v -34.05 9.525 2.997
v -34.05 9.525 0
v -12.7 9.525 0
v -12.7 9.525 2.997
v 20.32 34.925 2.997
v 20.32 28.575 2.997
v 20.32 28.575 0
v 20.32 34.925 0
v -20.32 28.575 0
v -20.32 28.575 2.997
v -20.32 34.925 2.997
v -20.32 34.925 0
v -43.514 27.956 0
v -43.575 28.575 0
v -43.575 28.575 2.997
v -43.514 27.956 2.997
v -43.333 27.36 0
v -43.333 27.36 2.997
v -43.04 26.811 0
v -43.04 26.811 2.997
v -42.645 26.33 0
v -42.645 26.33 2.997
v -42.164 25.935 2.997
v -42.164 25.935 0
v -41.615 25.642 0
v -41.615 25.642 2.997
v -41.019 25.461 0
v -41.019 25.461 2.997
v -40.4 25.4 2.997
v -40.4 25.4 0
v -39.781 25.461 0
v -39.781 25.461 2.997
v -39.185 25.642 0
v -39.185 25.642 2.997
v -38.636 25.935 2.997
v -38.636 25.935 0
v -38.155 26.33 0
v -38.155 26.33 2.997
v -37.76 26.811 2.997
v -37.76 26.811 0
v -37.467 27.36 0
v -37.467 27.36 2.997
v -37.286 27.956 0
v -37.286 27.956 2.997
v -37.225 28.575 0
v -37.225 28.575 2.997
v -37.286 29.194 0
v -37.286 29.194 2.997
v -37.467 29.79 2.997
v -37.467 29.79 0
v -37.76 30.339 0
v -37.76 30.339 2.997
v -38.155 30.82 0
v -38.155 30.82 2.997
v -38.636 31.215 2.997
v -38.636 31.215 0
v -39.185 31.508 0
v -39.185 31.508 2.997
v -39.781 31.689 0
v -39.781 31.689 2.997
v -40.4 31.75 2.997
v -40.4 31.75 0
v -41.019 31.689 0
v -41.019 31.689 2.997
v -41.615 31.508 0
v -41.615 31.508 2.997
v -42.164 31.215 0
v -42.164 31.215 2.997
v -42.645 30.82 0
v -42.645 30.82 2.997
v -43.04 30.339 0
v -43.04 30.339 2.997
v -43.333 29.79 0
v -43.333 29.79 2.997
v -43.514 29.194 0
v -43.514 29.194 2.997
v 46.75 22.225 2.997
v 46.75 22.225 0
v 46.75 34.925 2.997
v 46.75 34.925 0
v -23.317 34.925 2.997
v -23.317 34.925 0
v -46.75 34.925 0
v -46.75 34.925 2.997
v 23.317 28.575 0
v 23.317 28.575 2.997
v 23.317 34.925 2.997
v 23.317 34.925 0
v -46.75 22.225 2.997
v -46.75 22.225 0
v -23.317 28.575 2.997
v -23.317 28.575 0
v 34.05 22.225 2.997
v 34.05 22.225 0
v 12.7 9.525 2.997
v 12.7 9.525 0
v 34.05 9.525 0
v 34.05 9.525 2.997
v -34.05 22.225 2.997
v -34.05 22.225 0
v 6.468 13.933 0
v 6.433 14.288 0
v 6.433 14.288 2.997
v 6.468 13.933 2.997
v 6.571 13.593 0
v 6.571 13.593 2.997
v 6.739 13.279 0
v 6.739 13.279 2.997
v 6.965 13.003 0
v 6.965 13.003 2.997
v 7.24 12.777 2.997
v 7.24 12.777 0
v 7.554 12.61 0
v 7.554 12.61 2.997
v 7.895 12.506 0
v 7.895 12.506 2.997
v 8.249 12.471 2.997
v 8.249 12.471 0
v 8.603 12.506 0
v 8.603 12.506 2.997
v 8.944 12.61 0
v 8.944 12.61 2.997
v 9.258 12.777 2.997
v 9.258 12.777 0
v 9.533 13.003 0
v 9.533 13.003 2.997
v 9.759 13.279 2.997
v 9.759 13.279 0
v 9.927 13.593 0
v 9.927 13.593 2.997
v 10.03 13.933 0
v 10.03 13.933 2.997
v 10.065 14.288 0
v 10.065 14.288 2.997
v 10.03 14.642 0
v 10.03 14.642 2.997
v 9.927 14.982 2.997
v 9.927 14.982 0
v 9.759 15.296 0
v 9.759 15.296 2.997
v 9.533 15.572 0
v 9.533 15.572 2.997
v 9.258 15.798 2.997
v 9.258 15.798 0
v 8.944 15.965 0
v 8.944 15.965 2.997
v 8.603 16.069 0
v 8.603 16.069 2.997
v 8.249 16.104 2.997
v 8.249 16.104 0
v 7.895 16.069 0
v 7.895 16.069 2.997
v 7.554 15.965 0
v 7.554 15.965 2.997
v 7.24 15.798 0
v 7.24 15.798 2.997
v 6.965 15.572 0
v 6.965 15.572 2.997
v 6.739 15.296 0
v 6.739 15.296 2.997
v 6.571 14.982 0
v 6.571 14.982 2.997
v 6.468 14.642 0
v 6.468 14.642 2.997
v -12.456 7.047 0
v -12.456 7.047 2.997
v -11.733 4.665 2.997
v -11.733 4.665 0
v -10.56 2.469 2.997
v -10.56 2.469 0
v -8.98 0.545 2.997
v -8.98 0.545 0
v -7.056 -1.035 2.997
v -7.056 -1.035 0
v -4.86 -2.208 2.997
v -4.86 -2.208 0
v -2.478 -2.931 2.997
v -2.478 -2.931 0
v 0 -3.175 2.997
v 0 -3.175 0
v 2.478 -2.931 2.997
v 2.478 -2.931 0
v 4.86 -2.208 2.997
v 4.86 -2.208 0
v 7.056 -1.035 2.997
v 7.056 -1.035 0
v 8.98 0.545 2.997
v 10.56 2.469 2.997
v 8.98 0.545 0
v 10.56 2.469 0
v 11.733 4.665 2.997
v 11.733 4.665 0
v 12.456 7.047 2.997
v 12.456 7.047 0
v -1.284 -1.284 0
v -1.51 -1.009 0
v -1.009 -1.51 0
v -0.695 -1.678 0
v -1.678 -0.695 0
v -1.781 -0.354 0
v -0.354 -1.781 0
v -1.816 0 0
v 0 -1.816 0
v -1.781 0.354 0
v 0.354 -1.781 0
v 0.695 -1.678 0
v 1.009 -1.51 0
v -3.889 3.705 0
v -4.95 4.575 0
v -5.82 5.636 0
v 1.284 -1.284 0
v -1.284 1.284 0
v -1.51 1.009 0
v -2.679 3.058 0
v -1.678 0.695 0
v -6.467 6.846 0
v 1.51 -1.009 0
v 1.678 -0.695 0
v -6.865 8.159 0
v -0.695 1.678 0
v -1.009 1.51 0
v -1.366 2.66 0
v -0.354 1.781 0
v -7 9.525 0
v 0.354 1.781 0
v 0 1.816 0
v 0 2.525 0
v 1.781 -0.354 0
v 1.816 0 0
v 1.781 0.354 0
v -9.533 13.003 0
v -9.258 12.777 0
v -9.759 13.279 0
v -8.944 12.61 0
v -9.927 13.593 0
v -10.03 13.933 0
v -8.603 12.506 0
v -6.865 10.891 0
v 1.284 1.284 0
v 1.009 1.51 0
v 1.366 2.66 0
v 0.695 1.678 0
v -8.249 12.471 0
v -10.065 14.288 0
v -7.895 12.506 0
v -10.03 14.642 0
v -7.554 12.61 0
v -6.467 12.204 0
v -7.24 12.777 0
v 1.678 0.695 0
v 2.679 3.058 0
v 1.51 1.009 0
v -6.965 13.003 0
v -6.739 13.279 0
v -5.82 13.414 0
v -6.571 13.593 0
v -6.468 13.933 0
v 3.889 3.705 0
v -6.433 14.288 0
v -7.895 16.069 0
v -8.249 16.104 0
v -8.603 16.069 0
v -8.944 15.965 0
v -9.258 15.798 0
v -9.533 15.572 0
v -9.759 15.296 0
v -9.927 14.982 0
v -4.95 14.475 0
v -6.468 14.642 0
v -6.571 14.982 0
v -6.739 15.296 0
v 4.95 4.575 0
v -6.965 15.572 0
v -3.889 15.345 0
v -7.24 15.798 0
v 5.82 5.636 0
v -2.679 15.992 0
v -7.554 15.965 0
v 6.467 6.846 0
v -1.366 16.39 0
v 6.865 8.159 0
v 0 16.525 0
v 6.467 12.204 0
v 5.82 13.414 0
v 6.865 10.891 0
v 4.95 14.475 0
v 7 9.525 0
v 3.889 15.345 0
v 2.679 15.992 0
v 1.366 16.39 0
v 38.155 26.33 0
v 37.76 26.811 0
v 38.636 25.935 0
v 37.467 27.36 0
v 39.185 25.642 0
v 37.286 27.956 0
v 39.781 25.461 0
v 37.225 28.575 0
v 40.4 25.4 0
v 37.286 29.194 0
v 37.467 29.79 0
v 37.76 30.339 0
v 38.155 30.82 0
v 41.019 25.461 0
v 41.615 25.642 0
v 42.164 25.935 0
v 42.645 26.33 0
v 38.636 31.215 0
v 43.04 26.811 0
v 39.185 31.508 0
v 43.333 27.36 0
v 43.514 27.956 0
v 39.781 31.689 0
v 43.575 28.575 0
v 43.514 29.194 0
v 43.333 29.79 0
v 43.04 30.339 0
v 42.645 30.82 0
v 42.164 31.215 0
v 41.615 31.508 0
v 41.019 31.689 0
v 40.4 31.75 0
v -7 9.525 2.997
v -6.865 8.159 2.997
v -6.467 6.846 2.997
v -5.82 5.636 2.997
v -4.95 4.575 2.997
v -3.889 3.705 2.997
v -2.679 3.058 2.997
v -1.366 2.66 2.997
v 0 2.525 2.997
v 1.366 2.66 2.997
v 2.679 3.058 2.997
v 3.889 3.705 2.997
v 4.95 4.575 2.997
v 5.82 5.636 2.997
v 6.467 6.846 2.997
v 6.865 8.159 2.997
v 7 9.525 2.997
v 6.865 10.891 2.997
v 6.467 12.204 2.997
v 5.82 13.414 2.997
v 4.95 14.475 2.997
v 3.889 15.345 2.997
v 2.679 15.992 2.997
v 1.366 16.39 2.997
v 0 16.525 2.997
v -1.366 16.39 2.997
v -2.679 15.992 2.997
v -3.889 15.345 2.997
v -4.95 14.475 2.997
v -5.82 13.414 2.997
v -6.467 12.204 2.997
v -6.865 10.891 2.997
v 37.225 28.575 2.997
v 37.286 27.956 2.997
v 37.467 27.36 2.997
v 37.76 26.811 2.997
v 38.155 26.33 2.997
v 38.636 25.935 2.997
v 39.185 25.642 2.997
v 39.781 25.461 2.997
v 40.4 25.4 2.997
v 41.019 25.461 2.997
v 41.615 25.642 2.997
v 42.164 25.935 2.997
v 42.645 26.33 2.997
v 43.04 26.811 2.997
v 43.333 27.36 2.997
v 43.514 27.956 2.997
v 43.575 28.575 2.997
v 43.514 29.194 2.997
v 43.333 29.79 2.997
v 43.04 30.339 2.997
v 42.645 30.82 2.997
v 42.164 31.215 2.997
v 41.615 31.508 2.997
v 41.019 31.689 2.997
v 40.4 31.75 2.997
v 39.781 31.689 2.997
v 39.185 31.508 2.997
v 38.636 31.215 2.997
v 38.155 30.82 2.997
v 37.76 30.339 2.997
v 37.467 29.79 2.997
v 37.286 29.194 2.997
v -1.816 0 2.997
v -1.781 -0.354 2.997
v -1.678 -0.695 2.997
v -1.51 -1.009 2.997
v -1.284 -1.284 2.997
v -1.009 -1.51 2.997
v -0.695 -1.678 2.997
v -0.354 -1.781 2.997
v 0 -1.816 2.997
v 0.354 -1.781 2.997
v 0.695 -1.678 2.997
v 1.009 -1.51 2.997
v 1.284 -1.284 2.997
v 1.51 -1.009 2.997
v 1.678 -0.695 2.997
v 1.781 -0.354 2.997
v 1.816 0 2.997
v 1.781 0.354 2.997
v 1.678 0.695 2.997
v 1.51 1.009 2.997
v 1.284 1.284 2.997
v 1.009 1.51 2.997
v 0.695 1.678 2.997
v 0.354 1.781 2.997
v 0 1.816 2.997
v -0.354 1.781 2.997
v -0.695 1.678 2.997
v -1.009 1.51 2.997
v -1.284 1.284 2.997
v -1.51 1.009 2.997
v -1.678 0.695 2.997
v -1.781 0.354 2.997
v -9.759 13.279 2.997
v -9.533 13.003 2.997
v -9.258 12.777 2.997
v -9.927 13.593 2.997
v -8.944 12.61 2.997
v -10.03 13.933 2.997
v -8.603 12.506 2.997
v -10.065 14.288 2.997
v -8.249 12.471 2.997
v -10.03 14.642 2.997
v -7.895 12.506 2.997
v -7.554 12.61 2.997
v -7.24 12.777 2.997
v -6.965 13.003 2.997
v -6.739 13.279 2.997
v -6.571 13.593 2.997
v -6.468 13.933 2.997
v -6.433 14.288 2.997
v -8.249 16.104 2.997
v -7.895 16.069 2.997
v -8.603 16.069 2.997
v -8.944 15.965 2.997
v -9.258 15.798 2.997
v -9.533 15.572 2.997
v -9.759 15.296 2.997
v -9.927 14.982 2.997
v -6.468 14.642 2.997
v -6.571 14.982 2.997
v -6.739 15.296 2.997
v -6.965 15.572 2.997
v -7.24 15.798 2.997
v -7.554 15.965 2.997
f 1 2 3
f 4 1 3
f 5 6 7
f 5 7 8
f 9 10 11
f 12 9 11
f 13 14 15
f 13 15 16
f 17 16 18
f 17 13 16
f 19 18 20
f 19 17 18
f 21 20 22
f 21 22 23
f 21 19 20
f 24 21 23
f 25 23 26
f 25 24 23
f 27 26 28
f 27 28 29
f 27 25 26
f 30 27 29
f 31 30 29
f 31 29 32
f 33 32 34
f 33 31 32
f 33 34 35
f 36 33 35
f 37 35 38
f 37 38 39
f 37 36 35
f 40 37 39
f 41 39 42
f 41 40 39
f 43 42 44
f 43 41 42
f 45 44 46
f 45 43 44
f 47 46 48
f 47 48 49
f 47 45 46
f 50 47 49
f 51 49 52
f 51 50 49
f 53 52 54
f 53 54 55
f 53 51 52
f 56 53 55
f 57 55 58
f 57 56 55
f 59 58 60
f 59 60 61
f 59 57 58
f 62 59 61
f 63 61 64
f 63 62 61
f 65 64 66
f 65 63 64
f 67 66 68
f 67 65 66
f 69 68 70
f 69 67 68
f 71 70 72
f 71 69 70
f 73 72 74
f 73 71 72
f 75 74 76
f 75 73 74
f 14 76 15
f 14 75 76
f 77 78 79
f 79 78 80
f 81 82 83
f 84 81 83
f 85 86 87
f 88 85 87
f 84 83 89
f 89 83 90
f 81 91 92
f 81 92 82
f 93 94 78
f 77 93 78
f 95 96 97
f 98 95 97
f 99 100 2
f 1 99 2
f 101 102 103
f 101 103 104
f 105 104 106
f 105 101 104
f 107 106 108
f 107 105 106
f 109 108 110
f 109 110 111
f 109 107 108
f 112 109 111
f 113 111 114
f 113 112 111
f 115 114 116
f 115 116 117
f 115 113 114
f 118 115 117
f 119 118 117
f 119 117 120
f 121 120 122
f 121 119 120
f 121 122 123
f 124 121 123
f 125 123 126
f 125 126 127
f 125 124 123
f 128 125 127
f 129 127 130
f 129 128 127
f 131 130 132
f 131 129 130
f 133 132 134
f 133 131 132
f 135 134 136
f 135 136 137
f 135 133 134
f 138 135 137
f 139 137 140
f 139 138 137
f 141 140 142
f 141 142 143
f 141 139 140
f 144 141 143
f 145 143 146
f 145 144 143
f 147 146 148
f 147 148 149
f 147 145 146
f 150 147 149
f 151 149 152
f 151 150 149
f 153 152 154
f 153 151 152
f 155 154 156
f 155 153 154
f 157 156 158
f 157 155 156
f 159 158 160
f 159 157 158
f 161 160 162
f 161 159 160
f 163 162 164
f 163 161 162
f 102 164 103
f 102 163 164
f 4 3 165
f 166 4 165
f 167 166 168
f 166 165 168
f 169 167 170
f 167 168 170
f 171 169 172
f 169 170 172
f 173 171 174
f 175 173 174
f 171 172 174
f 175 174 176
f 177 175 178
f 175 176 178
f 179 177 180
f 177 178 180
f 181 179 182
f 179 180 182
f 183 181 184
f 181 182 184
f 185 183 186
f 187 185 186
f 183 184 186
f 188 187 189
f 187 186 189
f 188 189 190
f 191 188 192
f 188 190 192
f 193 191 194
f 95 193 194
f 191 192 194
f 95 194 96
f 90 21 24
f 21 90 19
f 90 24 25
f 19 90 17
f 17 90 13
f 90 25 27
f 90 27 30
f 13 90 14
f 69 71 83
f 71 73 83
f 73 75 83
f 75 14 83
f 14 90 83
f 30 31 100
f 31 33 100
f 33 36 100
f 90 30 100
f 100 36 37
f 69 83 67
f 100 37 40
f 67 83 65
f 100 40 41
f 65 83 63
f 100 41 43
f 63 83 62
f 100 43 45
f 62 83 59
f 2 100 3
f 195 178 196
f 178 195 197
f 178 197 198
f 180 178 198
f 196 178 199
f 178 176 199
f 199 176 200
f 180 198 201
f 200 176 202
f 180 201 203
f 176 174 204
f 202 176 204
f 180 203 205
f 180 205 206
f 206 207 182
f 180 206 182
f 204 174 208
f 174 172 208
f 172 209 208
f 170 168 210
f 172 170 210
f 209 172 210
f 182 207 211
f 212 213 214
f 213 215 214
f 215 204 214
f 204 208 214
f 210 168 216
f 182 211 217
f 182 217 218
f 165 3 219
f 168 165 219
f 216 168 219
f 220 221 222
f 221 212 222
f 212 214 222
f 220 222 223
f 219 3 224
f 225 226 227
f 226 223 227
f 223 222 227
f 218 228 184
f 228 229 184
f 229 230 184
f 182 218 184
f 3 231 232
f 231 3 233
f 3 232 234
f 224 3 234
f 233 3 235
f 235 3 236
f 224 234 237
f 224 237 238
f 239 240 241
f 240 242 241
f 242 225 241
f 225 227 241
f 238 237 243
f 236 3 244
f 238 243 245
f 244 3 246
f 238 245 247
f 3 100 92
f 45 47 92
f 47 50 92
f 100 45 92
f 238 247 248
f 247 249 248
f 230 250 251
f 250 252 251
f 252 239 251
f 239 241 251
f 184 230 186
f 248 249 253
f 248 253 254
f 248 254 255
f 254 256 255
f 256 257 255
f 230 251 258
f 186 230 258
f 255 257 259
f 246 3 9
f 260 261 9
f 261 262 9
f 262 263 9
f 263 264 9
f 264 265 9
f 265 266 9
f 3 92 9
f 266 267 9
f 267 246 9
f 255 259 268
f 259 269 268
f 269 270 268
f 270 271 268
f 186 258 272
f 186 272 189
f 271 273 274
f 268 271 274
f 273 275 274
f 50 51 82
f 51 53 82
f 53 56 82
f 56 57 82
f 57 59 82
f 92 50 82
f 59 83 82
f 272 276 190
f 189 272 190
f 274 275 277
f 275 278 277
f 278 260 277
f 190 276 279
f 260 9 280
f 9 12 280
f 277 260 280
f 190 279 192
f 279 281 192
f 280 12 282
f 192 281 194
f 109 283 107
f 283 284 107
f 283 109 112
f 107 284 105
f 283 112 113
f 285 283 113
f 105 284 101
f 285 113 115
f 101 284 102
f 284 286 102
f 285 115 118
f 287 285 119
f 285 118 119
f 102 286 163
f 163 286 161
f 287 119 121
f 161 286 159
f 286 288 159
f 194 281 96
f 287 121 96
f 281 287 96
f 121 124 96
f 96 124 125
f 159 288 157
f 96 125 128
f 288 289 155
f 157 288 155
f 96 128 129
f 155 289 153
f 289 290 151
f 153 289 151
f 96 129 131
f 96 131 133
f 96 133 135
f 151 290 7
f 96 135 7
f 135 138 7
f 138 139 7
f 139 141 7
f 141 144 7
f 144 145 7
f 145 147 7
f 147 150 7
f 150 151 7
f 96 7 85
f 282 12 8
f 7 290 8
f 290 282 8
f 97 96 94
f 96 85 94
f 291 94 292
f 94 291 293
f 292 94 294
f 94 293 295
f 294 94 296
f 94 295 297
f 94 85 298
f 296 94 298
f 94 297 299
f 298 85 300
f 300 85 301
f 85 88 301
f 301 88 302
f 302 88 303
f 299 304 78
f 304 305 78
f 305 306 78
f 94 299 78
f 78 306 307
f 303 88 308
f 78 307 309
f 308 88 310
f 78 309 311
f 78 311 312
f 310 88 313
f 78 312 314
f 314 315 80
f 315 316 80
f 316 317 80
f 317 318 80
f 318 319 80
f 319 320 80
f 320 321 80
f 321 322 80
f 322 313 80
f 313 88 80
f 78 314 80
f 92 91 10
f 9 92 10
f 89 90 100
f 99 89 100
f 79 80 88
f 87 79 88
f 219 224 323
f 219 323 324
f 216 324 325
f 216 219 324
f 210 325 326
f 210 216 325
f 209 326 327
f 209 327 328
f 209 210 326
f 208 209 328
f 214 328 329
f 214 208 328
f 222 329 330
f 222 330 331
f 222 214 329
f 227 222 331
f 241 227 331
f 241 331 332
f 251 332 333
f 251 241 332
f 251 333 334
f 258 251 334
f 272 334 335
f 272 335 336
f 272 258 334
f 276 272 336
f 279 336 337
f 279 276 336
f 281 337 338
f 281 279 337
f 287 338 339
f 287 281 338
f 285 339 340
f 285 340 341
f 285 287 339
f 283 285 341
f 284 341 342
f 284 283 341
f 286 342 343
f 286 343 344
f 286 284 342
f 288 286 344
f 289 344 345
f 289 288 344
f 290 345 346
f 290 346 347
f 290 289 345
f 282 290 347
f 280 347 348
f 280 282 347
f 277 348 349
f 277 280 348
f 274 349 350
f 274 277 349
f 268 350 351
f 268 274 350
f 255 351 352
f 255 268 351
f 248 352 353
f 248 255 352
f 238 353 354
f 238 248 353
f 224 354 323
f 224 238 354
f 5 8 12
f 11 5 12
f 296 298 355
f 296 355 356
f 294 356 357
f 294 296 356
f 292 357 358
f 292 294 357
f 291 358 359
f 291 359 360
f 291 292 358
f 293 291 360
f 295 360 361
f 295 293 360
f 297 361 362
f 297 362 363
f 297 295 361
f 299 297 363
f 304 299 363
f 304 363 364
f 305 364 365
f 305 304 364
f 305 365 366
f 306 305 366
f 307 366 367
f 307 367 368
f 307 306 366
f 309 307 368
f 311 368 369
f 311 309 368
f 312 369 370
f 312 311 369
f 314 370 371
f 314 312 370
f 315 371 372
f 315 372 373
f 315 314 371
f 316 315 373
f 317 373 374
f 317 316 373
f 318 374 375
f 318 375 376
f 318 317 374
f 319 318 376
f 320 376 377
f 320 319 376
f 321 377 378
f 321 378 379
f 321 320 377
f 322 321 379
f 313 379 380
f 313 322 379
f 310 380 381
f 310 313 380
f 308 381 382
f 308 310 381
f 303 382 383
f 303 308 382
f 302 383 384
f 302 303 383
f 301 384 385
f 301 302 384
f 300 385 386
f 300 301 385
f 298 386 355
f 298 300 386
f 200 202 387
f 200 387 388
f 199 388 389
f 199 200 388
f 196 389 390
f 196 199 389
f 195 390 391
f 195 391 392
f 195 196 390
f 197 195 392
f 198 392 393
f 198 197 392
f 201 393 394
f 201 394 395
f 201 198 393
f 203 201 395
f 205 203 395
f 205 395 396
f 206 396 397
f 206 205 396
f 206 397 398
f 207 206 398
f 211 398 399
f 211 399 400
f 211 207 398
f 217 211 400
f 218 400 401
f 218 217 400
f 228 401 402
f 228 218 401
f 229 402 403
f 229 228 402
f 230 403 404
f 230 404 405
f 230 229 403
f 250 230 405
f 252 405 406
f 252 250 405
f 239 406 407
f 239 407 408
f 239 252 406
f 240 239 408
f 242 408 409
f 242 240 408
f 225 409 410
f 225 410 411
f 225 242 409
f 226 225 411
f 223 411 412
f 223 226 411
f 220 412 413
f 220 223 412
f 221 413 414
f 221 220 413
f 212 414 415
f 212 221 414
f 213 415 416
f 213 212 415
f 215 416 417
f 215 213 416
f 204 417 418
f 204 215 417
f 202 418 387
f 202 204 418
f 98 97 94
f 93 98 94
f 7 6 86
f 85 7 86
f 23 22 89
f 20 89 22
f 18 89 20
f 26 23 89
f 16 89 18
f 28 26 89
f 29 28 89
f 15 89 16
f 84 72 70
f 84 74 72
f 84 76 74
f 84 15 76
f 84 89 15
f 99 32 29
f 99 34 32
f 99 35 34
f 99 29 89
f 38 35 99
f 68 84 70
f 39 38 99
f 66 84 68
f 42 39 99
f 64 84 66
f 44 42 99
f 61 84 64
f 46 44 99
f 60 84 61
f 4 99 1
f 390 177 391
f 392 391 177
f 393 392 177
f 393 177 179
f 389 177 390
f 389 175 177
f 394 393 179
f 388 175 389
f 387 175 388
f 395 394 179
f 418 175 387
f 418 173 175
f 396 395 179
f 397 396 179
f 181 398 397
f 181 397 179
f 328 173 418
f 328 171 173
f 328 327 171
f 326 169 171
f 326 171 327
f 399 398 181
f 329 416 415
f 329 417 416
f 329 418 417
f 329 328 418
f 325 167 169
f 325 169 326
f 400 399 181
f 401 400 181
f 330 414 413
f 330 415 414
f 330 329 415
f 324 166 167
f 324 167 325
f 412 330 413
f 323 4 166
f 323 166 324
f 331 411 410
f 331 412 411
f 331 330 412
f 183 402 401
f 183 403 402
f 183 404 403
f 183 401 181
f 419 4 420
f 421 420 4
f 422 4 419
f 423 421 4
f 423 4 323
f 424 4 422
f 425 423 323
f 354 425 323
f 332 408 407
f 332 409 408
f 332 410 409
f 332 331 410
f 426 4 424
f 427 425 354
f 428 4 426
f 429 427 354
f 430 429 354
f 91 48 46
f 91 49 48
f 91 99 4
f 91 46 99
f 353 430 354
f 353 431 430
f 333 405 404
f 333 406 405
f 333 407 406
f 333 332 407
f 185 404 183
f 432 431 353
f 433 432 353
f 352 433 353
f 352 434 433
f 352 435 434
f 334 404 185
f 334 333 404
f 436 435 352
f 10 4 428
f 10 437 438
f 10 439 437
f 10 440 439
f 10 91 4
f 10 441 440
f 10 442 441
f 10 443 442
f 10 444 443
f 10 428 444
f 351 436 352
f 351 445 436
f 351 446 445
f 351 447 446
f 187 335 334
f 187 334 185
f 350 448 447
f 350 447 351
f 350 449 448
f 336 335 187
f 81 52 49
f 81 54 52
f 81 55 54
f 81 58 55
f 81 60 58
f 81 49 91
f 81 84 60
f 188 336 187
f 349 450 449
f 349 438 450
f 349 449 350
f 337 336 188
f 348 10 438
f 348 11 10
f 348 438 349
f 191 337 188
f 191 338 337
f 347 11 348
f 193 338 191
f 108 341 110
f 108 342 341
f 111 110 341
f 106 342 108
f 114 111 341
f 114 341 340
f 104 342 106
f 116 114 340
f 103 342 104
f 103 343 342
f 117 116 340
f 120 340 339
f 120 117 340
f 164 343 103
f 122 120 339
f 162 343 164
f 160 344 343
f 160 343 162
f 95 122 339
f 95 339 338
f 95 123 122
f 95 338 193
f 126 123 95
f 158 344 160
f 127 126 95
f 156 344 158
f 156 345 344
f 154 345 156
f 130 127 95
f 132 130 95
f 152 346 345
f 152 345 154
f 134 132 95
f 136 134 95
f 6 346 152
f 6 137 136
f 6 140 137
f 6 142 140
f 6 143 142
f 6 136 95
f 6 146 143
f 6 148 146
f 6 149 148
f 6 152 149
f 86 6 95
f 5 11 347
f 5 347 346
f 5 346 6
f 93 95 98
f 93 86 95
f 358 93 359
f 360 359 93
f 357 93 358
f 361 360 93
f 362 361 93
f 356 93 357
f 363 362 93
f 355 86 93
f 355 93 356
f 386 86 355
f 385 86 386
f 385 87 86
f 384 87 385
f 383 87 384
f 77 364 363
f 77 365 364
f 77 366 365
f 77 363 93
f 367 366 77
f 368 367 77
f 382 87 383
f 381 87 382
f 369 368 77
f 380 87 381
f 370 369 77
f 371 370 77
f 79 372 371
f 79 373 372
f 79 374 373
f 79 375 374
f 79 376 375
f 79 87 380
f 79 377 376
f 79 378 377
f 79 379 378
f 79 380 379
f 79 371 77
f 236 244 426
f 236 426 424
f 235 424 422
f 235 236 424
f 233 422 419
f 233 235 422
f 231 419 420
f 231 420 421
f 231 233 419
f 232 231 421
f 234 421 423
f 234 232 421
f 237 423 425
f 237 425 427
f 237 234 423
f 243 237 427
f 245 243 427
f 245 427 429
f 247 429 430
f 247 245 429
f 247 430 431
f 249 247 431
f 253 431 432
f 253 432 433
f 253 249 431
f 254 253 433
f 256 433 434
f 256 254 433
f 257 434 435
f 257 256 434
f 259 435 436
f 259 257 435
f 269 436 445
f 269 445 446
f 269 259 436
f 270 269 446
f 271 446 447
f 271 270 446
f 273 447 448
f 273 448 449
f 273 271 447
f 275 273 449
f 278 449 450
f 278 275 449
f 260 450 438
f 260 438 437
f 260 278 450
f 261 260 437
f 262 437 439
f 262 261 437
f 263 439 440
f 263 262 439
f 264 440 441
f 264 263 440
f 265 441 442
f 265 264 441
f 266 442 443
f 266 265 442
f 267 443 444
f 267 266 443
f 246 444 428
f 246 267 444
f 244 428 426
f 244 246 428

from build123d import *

# Parameters (mm, degrees)
SKETCH1_R           = 3.175
SKETCH1_R_2         = 1.8161
SKETCH1_R_3         = 7
BOSS_EXTRUDE1_DEPTH = 2.9972
SKETCH2_W           = 2.9972
SKETCH2_H           = 6.35
CUT_EXTRUDE1_DEPTH  = 59.432023179


with BuildPart() as part:
    # Sketch1 → Boss-Extrude1 (new body)
    with BuildSketch(Plane.XY):
        with BuildLine():
            Line((-34.05, 9.525), (-12.7, 9.525))
            ThreePointArc((-12.7, 9.525), (0, -3.175), (12.7, 9.525))
            Line((12.7, 9.525), (34.05, 9.525))
            Line((34.05, 9.525), (34.05, 22.225))
            Line((34.05, 22.225), (46.75, 22.225))
            Line((46.75, 22.225), (46.75, 34.925))
            Line((46.75, 34.925), (-46.75, 34.925))
            Line((-46.75, 34.925), (-46.75, 22.225))
            Line((-46.75, 22.225), (-34.05, 22.225))
            Line((-34.05, 22.225), (-34.05, 9.525))
        make_face()
        with Locations((-40.4, 28.575)):
            Circle(SKETCH1_R, mode=Mode.SUBTRACT)
        with Locations((40.4, 28.575)):
            Circle(SKETCH1_R, mode=Mode.SUBTRACT)
        with Locations((8.248891971, 14.2875)):
            Circle(SKETCH1_R_2, mode=Mode.SUBTRACT)
        with Locations((-8.248891971, 14.2875)):
            Circle(SKETCH1_R_2, mode=Mode.SUBTRACT)
        Circle(SKETCH1_R_2, mode=Mode.SUBTRACT)
        with Locations((0, 9.525)):
            Circle(SKETCH1_R_3, mode=Mode.SUBTRACT)
    extrude(amount=BOSS_EXTRUDE1_DEPTH)

    # Sketch2 → Cut-Extrude1 (cut, through all)
    with BuildSketch(Plane.XY.offset(2.9972)):
        with Locations((-21.8186, 31.75)):
            Rectangle(SKETCH2_W, SKETCH2_H)
        with Locations((21.8186, 31.75)):
            Rectangle(SKETCH2_W, SKETCH2_H)
    extrude(amount=-CUT_EXTRUDE1_DEPTH, mode=Mode.SUBTRACT)


solid = part.part
